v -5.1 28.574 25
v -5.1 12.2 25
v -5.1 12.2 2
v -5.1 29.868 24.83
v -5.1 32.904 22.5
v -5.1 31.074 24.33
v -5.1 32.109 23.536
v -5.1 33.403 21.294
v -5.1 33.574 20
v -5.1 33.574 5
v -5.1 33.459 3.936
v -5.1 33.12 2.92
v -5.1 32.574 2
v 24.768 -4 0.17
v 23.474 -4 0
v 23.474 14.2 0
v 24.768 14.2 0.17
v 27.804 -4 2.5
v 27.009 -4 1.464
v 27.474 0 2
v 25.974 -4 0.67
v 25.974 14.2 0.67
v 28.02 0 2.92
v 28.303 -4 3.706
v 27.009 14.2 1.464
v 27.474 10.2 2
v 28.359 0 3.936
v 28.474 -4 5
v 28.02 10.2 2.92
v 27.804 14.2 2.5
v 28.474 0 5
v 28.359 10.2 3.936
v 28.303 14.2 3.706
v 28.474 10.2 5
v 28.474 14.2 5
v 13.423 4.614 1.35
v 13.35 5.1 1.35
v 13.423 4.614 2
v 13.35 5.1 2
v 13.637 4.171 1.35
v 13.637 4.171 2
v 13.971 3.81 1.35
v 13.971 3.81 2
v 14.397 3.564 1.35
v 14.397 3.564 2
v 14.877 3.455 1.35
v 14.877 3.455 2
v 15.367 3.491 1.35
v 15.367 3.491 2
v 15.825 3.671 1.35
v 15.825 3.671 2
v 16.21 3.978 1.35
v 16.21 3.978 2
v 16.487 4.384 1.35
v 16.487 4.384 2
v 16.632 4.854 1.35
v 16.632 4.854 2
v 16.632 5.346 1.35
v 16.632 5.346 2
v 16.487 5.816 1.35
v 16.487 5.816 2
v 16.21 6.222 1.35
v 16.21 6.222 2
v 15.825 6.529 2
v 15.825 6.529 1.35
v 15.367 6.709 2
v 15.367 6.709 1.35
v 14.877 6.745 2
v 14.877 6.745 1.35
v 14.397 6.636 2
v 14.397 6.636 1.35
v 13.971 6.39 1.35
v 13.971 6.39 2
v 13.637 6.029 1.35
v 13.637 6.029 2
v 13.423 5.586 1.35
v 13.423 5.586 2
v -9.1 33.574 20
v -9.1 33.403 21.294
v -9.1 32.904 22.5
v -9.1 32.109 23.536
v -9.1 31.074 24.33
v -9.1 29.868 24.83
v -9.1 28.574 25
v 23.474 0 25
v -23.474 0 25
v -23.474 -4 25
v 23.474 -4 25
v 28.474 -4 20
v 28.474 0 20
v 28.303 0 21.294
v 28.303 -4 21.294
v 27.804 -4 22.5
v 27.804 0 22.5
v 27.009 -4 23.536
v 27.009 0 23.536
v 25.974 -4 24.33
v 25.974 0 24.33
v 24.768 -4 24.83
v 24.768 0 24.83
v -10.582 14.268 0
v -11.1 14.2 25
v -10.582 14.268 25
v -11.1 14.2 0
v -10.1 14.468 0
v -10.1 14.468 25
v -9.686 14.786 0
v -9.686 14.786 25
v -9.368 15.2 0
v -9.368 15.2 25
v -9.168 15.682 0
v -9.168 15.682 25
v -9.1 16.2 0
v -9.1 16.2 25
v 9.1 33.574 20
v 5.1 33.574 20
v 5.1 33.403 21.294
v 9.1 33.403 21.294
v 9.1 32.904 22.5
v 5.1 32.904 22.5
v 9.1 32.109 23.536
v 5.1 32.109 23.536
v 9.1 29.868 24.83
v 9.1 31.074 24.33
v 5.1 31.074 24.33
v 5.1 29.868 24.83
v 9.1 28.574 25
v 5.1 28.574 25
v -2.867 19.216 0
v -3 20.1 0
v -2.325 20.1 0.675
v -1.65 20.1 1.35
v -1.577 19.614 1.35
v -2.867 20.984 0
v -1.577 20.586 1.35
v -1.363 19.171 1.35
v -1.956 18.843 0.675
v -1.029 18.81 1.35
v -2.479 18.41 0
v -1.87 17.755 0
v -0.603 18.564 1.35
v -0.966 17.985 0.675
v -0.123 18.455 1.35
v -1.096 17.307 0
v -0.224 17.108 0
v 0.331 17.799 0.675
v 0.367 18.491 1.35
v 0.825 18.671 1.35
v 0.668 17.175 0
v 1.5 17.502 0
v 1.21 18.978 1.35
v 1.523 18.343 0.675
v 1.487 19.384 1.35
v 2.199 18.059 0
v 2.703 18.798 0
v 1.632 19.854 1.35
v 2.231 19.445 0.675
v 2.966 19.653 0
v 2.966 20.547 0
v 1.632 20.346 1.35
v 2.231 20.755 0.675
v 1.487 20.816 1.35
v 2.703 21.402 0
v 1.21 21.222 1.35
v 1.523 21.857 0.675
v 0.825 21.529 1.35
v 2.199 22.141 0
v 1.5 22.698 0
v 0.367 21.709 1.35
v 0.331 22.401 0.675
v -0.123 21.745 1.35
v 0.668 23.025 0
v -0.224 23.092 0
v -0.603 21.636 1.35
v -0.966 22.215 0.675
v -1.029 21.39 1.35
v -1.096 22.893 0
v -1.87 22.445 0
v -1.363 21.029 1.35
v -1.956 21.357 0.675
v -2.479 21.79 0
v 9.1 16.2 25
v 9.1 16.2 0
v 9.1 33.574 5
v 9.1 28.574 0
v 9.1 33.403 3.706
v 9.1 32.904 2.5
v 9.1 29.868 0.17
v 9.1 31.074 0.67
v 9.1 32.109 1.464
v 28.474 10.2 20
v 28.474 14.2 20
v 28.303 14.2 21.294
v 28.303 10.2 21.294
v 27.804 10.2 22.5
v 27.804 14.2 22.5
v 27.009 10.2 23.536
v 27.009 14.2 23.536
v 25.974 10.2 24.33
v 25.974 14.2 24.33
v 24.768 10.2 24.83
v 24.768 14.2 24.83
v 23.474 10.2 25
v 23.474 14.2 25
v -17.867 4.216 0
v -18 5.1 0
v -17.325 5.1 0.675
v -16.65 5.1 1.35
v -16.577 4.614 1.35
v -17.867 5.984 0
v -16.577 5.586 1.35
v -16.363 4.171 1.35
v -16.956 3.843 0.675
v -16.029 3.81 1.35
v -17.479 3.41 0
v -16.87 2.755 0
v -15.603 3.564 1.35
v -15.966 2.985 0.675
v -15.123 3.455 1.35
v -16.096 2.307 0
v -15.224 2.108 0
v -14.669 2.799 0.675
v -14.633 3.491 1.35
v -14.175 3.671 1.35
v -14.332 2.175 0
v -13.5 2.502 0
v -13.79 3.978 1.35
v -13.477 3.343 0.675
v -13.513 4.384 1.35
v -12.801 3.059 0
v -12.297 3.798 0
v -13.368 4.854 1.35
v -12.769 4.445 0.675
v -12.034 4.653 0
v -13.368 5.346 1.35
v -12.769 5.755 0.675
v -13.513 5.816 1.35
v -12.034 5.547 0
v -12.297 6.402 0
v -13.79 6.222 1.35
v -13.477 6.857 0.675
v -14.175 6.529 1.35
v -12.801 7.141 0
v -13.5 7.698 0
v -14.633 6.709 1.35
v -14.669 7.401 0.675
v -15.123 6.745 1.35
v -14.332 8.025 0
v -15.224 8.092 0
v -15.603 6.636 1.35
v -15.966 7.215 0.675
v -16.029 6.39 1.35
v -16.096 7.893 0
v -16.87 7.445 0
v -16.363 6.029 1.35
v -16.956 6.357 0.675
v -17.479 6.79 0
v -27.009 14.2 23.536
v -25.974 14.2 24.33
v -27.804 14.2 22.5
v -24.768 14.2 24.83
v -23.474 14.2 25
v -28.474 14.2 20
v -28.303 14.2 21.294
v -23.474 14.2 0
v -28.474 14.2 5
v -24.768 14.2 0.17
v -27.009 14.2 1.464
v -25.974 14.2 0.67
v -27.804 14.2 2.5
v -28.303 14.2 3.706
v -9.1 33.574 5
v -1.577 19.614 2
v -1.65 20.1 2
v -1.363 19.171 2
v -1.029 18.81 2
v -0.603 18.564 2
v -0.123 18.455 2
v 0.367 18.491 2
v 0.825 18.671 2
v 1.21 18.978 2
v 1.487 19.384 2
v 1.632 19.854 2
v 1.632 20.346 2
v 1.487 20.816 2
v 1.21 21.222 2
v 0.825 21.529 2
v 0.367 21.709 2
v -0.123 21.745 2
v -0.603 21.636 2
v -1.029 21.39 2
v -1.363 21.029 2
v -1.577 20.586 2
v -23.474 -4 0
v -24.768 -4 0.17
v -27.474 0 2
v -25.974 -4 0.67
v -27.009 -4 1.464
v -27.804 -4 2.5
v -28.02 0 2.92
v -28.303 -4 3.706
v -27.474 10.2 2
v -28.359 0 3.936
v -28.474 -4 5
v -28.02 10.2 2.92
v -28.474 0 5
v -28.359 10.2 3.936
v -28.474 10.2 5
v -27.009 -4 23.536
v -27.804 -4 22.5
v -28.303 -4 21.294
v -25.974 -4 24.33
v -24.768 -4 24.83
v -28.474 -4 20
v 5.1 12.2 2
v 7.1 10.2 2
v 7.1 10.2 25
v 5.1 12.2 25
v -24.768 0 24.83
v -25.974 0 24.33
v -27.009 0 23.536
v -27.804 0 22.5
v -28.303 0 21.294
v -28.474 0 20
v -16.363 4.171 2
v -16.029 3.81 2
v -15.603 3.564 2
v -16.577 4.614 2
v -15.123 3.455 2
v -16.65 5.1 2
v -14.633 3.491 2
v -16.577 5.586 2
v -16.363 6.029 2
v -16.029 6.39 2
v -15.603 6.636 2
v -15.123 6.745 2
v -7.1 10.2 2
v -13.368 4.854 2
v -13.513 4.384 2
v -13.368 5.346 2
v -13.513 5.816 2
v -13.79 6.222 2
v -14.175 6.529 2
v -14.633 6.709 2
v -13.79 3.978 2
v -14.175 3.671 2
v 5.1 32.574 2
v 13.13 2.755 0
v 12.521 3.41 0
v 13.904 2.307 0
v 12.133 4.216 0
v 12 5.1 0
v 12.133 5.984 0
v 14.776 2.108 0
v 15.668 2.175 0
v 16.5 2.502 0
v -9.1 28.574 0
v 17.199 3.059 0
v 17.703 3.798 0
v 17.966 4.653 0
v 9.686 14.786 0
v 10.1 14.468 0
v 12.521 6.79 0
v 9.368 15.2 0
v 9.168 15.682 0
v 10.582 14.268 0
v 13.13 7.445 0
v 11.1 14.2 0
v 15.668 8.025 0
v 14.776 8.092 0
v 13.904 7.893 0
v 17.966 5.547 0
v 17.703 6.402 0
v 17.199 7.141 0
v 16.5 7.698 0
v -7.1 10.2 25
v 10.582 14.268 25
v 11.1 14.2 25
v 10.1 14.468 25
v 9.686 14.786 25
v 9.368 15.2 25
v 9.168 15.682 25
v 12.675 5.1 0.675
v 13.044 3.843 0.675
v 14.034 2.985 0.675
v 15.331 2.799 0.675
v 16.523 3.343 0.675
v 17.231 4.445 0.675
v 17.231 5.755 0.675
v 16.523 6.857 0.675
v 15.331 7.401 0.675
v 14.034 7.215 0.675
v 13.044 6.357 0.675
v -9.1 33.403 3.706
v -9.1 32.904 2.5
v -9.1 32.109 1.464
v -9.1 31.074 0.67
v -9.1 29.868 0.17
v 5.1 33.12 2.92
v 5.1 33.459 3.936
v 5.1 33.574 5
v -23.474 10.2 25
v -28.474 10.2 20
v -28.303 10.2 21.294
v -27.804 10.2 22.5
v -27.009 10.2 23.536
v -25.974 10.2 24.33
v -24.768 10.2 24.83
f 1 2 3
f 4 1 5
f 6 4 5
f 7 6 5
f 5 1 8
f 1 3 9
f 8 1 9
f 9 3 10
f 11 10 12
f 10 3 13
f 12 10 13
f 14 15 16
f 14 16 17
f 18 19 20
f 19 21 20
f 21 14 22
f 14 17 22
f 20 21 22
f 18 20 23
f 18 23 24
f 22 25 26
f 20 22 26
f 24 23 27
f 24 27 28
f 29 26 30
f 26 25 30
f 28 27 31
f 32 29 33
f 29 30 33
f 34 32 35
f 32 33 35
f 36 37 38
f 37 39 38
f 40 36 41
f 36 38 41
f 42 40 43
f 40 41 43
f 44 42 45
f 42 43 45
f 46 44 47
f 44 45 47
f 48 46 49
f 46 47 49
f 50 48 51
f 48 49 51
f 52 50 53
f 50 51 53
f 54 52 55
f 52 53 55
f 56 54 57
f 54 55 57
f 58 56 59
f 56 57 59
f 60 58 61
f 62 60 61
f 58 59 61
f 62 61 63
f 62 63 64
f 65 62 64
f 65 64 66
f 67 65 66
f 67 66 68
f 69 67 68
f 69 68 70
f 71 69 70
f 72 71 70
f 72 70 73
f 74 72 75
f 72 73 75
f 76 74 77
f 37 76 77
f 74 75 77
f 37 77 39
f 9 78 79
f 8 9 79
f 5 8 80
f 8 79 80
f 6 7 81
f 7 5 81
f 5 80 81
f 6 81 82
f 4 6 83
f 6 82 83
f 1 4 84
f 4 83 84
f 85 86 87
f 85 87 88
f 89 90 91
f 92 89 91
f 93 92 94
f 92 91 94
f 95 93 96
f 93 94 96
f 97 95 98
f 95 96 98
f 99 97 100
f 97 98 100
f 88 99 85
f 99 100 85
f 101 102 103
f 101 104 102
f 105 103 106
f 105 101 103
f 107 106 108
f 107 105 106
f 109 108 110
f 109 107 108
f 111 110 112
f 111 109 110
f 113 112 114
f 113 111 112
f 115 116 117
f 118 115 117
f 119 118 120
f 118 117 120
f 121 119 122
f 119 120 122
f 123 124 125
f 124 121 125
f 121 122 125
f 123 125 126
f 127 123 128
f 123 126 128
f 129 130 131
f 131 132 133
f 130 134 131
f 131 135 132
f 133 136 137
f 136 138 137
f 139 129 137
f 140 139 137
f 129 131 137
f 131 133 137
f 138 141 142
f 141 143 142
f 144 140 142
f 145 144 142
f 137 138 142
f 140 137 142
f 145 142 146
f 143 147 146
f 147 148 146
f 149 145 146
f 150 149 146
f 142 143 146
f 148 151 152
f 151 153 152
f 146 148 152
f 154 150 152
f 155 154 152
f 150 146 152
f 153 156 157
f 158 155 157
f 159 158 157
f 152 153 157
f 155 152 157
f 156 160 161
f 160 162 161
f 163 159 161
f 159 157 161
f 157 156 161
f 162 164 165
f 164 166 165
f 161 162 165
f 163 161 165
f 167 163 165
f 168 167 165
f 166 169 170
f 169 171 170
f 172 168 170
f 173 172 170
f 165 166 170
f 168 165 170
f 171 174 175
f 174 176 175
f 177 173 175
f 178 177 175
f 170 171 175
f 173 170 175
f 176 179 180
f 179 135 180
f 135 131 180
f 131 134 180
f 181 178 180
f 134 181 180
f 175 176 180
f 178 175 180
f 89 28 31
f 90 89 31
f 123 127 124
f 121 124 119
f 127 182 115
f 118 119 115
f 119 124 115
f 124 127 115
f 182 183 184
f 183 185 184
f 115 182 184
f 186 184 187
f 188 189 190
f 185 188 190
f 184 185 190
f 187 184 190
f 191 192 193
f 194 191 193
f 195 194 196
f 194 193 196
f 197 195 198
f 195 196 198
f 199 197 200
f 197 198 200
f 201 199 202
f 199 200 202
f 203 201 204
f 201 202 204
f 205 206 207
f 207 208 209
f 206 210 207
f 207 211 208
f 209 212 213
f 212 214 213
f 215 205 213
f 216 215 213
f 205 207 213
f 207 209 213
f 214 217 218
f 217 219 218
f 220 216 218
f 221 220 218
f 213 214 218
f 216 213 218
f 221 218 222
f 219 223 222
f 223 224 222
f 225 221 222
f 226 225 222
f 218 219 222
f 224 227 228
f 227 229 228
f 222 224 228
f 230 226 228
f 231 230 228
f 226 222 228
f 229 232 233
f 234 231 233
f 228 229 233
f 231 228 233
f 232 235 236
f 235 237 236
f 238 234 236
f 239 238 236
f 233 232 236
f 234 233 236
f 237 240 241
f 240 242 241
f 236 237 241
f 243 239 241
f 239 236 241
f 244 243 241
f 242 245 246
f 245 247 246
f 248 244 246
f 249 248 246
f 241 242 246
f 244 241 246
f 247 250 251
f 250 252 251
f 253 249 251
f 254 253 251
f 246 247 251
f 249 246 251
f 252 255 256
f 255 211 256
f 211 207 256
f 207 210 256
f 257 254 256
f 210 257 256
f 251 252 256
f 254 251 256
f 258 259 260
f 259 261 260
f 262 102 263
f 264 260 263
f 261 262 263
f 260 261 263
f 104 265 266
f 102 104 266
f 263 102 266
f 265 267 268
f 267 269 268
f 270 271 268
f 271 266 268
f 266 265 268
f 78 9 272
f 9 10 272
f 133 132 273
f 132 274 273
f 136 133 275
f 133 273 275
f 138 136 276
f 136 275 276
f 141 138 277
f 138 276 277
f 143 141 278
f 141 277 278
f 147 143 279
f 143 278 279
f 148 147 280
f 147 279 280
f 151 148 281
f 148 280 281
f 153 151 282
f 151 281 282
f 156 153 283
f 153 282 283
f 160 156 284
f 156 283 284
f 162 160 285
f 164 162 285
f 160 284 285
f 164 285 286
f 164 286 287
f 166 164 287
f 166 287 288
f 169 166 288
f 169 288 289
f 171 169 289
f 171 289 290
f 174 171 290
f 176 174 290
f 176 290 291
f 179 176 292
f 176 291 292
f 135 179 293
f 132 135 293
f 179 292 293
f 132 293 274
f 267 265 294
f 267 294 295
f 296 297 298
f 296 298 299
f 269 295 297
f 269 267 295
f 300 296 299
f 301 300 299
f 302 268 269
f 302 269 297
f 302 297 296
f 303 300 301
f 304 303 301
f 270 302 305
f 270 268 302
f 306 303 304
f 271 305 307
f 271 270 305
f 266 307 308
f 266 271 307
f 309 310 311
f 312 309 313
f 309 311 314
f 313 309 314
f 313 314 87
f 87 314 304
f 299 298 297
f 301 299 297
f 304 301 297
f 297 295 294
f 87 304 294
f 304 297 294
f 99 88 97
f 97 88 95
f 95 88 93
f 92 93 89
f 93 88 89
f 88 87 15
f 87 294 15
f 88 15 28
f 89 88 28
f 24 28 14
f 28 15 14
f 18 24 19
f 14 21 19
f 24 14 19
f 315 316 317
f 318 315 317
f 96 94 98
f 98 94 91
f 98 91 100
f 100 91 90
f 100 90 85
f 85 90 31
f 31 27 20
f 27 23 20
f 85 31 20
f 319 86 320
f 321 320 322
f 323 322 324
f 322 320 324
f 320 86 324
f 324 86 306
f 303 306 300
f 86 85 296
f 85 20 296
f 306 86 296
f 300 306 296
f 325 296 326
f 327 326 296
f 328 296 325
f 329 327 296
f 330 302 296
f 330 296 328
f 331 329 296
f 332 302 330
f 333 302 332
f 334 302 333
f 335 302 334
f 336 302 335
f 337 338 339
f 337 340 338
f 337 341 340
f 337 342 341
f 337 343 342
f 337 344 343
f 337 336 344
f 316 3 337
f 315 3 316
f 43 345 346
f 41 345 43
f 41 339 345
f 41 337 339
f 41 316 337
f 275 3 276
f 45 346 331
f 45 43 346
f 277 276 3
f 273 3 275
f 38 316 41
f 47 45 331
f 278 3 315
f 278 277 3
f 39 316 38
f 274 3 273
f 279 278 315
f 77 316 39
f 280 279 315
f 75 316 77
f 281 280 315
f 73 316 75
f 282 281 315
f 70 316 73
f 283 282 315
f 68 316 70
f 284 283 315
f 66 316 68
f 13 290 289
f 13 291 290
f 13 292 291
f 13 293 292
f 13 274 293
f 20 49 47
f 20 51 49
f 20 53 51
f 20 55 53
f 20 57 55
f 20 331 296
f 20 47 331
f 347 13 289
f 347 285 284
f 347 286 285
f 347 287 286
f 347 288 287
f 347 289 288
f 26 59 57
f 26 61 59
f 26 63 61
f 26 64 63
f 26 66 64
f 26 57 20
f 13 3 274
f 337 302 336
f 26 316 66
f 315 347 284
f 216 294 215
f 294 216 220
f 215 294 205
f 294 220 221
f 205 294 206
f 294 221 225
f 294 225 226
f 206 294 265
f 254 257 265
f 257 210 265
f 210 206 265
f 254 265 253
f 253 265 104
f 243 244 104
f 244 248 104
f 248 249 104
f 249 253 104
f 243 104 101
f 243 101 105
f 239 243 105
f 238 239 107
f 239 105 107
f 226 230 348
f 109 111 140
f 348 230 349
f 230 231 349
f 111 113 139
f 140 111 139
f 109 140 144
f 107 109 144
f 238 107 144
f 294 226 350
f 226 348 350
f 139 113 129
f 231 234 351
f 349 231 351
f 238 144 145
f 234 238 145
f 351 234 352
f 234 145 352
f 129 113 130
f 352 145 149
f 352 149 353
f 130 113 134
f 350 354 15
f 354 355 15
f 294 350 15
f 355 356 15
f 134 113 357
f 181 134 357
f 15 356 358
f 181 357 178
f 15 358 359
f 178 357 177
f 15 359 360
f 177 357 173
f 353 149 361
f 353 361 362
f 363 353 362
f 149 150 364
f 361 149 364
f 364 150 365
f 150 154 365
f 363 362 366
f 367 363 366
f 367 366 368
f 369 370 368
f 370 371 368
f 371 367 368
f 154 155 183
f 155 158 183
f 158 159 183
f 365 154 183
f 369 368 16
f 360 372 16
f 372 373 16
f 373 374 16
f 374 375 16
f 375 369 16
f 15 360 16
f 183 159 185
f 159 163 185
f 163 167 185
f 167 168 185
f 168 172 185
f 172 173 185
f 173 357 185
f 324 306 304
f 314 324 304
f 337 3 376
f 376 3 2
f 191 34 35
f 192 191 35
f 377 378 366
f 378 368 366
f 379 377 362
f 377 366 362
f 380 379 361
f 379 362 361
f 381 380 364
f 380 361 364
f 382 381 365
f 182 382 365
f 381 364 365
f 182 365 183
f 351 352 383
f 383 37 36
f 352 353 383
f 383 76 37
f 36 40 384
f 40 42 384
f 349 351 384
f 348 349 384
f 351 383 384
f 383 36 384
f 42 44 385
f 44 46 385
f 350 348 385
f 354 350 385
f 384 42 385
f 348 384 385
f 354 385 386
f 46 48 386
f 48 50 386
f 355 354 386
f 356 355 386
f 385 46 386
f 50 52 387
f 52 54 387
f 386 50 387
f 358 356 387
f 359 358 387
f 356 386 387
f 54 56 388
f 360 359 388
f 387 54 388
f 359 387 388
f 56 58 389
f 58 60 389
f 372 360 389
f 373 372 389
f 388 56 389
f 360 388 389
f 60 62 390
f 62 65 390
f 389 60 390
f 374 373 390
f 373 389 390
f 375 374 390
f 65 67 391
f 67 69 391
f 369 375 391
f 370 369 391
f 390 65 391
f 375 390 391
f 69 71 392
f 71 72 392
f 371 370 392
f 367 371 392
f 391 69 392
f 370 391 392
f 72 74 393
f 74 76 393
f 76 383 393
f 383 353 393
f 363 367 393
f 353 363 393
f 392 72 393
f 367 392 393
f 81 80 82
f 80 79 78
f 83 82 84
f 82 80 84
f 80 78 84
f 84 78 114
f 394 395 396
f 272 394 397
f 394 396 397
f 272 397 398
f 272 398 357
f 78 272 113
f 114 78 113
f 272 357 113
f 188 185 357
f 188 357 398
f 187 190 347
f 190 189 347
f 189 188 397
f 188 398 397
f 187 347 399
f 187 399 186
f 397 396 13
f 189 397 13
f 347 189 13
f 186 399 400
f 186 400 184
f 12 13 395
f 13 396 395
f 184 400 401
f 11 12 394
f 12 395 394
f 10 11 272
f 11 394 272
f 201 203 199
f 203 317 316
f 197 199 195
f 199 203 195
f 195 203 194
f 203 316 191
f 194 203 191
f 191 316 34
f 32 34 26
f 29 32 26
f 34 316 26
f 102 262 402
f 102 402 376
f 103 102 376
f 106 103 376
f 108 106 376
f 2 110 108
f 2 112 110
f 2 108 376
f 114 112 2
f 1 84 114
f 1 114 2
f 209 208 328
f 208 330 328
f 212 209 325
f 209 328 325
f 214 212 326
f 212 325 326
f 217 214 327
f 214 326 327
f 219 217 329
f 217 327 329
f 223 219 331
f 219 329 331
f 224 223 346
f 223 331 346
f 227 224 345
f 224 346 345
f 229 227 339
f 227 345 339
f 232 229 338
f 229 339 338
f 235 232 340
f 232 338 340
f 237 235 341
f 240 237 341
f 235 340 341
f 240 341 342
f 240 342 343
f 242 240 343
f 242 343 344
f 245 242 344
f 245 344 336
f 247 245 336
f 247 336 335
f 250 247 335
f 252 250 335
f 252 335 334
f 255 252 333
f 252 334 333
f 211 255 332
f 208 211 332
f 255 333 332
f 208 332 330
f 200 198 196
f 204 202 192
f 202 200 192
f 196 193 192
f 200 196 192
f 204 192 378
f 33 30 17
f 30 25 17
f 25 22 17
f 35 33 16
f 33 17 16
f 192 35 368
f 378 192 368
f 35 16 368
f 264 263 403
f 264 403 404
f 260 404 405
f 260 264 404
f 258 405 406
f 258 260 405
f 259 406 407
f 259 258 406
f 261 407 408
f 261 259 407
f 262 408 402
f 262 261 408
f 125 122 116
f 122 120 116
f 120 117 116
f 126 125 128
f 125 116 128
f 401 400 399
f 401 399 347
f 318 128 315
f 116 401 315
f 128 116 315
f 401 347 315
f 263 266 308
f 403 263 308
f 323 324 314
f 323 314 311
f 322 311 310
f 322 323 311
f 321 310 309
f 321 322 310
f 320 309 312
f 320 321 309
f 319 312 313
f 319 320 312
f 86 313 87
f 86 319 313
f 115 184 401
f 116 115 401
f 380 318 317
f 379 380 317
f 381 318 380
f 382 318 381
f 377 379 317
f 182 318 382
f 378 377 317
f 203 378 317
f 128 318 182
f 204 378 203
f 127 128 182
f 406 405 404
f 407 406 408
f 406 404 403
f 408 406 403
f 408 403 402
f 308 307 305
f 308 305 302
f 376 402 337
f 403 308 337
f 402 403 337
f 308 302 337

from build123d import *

# Parameters (mm, degrees)
F1_DEPTH       = 2
F2_DEPTH       = 25
F3_R           = 2
F4_T1_DEPTH    = 29
F4_T3_DEPTH    = 29
F4_T5_DEPTH    = 29
F4_T7_DEPTH    = 29
F4_T9_DEPTH    = 43.2
F4_T11_DEPTH   = 43.2
F5_R           = 2
F6_SIZE        = 2
F8_D           = 3.3
F8_CSINK_D     = 6
F8_CSINK_ANGLE = 90


# Not quite as in the source:
# - a fillet or chamfer that OpenCascade refuses, or shapes differently, is made with other operations: its cross-section is extruded or revolved along the edge and cut away or added


with BuildPart() as f1:
    # F0 (on Top) → F1 (new body)
    with BuildSketch(Plane.XY):
        Polygon((-28.4735770881, 0), (0, 0), (28.4735770881, 0), (28.4735770881, 10.2), (5.1, 10.2), (5.1, 33.5735770881), (-5.1, 33.5735770881), (-5.1, 10.2), (-28.4735770881, 10.2), align=None)
        Polygon((28.4735770881, 0), (0, 0), (-28.4735770881, 0), (-28.4735770881, -4), (0, -4), (28.4735770881, -4), align=None)
        Polygon((5.1, 10.2), (28.4735770881, 10.2), (28.4735770881, 14.2), (9.1, 14.2), (9.1, 33.5735770881), (5.1, 33.5735770881), align=None)
        Polygon((-28.4735770881, 14.2), (-28.4735770881, 10.2), (-5.1, 10.2), (-5.1, 33.5735770881), (-9.1, 33.5735770881), (-9.1, 14.2), align=None)
    extrude(amount=F1_DEPTH)

    # F0 (on Top) → F2 (join)
    with BuildSketch(Plane.XY):
        Polygon((-28.4735770881, 14.2), (-28.4735770881, 10.2), (-5.1, 10.2), (-5.1, 33.5735770881), (-9.1, 33.5735770881), (-9.1, 14.2), align=None)
        Polygon((5.1, 10.2), (28.4735770881, 10.2), (28.4735770881, 14.2), (9.1, 14.2), (9.1, 33.5735770881), (5.1, 33.5735770881), align=None)
        Polygon((28.4735770881, 0), (0, 0), (-28.4735770881, 0), (-28.4735770881, -4), (0, -4), (28.4735770881, -4), align=None)
    extrude(amount=F2_DEPTH)

    # F3
    f3_edges = [f1.edges().sort_by_distance(p)[0] for p in [
        (9.1, 14.2, 12.5),
    ]]
    fillet(f3_edges, radius=F3_R)

    # F4: fillet of radius 5 on 9 edges, made by hand

    # F4_s2 → F4_t1 (cut)
    with BuildSketch(Plane.XZ.offset(-12.5)):
        with BuildLine():
            ThreePointArc((28.4735770881, 20), (27.0091109941, 23.5355339059), (23.4735770881, 25))
            Line((23.4735770881, 25), (28.4735770881, 25))
            Line((28.4735770881, 25), (28.4735770881, 20))
        make_face()
        with BuildLine():
            ThreePointArc((-28.4735770881, 20), (-27.0091109941, 23.5355339059), (-23.4735770881, 25))
            Line((-23.4735770881, 25), (-28.4735770881, 25))
            Line((-28.4735770881, 25), (-28.4735770881, 20))
        make_face()
    extrude(amount=F4_T1_DEPTH, mode=Mode.SUBTRACT)

    # F4_s4 → F4_t3 (cut)
    with BuildSketch(Plane.XZ.offset(-26.7)):
        with BuildLine():
            ThreePointArc((28.4735770881, 20), (27.0091109941, 23.5355339059), (23.4735770881, 25))
            Line((23.4735770881, 25), (28.4735770881, 25))
            Line((28.4735770881, 25), (28.4735770881, 20))
        make_face()
        with BuildLine():
            ThreePointArc((-28.4735770881, 20), (-27.0091109941, 23.5355339059), (-23.4735770881, 25))
            Line((-23.4735770881, 25), (-28.4735770881, 25))
            Line((-28.4735770881, 25), (-28.4735770881, 20))
        make_face()
    extrude(amount=F4_T3_DEPTH, mode=Mode.SUBTRACT)

    # F4_s6 → F4_t5 (cut)
    with BuildSketch(Plane.YZ.offset(-21.6)):
        with BuildLine():
            ThreePointArc((33.5735770881, 20), (32.1091109941, 23.5355339059), (28.5735770881, 25))
            Line((28.5735770881, 25), (33.5735770881, 25))
            Line((33.5735770881, 25), (33.5735770881, 20))
        make_face()
    extrude(amount=F4_T5_DEPTH, mode=Mode.SUBTRACT)

    # F4_s8 → F4_t7 (cut)
    with BuildSketch(Plane.YZ.offset(-7.4)):
        with BuildLine():
            ThreePointArc((33.5735770881, 20), (32.1091109941, 23.5355339059), (28.5735770881, 25))
            Line((28.5735770881, 25), (33.5735770881, 25))
            Line((33.5735770881, 25), (33.5735770881, 20))
        make_face()
    extrude(amount=F4_T7_DEPTH, mode=Mode.SUBTRACT)

    # F4_s10 → F4_t9 (cut)
    with BuildSketch(Plane.XZ.offset(-26.7)):
        with BuildLine():
            ThreePointArc((-23.4735770881, 0), (-27.0091109941, 1.4644660941), (-28.4735770881, 5))
            Line((-28.4735770881, 5), (-28.4735770881, 0))
            Line((-28.4735770881, 0), (-23.4735770881, 0))
        make_face()
        with BuildLine():
            ThreePointArc((23.4735770881, 0), (27.0091109941, 1.4644660941), (28.4735770881, 5))
            Line((28.4735770881, 5), (28.4735770881, 0))
            Line((28.4735770881, 0), (23.4735770881, 0))
        make_face()
    extrude(amount=F4_T9_DEPTH, mode=Mode.SUBTRACT)

    # F4_s12 → F4_t11 (cut)
    with BuildSketch(Plane.YZ.offset(-21.6)):
        with BuildLine():
            ThreePointArc((28.5735770881, 0), (32.1091109941, 1.4644660941), (33.5735770881, 5))
            Line((33.5735770881, 5), (33.5735770881, 0))
            Line((33.5735770881, 0), (28.5735770881, 0))
        make_face()
    extrude(amount=F4_T11_DEPTH, mode=Mode.SUBTRACT)

    # F5
    f5_edges = [f1.edges().sort_by_distance(p)[0] for p in [
        (-9.1, 14.2, 12.5),
    ]]
    fillet(f5_edges, radius=F5_R)

    # F6
    f6_edges = [f1.edges().sort_by_distance(p)[0] for p in [
        (5.1, 10.2, 13.5),
        (-5.1, 10.2, 13.5),
    ]]
    chamfer(f6_edges, length=F6_SIZE)

    # F8 (through all)
    with Locations(Plane(origin=(0, 0, 0), x_dir=(1, 0, 0), z_dir=(0, 0, -1))):
        with Locations((-15, -5.1), (0, -20.1), (15, -5.1)):
            CounterSinkHole(F8_D / 2, F8_CSINK_D / 2, counter_sink_angle=F8_CSINK_ANGLE)


solid = f1.part
